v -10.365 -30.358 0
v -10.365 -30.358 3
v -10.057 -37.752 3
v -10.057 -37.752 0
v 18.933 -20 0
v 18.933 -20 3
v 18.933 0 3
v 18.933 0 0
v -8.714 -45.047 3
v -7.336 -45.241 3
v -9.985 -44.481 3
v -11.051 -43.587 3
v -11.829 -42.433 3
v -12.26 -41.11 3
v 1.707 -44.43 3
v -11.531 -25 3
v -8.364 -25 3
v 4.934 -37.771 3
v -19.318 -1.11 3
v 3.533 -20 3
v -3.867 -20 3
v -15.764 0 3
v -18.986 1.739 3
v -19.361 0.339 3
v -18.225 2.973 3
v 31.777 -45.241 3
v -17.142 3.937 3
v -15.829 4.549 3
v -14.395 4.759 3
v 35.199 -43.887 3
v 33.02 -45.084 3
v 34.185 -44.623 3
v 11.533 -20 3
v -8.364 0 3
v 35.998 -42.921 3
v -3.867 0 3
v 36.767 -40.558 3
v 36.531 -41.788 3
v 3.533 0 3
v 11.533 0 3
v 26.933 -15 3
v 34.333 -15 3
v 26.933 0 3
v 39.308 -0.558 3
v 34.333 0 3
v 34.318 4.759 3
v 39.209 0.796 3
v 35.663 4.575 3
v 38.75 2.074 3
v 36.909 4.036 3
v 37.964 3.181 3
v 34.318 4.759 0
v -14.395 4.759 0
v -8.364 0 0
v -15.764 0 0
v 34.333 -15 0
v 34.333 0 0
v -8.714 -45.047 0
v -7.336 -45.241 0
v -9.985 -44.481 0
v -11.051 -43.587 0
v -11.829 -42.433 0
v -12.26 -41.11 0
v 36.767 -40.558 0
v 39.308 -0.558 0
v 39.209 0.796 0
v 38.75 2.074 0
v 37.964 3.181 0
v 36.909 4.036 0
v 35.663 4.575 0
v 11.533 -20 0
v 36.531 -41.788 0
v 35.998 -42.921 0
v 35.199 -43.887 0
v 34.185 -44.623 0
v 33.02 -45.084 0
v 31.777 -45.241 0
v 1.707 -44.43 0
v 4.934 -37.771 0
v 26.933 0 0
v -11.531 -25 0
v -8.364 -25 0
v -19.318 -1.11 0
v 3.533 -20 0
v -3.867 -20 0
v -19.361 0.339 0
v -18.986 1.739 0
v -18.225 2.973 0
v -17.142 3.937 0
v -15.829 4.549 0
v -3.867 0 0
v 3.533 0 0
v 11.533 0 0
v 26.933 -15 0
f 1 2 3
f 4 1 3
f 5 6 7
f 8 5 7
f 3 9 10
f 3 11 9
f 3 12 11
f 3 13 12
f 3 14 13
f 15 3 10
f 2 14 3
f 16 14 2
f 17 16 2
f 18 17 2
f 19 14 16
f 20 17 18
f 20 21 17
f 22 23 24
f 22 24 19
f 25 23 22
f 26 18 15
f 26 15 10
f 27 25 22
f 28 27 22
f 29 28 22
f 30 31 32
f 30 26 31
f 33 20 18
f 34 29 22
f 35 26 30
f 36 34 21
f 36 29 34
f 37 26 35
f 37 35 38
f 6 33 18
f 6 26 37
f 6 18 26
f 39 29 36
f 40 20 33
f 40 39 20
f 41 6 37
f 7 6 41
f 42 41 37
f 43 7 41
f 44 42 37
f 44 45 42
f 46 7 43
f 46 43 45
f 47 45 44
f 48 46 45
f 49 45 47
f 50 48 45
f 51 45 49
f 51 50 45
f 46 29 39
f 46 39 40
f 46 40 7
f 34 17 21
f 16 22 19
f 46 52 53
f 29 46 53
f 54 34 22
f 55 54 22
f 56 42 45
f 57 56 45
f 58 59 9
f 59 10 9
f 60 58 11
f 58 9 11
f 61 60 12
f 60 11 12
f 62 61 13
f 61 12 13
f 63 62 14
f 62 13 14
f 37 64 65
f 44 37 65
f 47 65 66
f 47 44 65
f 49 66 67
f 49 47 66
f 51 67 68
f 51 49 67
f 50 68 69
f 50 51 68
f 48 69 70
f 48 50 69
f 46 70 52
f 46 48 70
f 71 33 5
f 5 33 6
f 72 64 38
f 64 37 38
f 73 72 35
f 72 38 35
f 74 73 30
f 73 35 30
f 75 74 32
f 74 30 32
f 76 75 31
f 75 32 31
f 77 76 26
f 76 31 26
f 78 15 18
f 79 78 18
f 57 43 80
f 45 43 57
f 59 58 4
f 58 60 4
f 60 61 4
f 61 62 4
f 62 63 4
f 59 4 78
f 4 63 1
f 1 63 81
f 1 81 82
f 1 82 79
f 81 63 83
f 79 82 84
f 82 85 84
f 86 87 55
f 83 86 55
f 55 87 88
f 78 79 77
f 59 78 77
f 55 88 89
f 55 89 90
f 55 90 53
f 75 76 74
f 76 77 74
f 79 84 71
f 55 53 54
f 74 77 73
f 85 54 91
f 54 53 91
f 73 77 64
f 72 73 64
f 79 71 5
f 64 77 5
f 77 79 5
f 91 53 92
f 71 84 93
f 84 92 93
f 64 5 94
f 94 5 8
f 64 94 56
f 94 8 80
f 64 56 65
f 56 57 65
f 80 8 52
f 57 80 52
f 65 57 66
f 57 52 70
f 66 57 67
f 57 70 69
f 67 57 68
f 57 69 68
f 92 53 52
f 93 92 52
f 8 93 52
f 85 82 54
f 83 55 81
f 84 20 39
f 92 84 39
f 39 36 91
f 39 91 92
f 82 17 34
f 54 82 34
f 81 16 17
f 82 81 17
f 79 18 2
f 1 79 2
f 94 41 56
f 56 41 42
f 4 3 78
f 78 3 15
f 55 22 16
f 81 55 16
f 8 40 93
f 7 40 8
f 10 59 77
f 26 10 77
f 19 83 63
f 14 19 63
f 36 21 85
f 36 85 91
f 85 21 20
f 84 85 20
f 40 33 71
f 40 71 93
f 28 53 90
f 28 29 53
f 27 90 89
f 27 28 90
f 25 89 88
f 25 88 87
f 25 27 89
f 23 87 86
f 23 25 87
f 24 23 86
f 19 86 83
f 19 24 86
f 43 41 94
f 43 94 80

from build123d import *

# Parameters (mm, degrees)
F1_DEPTH = 3
F2_W     = 7.4
F2_H     = 15
F2_H_2   = 20
F3_DEPTH = 3
F5_DEPTH = 3
F6_R     = 5


with BuildPart() as f1:
    # F0 (on Top) → F1 (new body)
    with BuildSketch(Plane.XY):
        Polygon((36.469397, -45.240614), (39.645866, 4.759386), (-20.354134, 4.759386), (-11.530603, -45.240614), align=None)
    extrude(amount=F1_DEPTH)

    # F2 (on face) → F3 (cut, through all)
    with BuildSketch(Plane.XY.offset(3)):
        with Locations((30.633425, -7.5)):
            Rectangle(F2_W, F2_H)
        with Locations((15.233425, -10)):
            Rectangle(F2_W, F2_H_2)
        with Locations((-0.166575, -10)):
            Rectangle(F2_W, F2_H_2)
        Polygon((-8.364385, 0), (-15.764385, 0), (-11.530603, -25), (-8.364385, -25), align=None)
    extrude(amount=-F3_DEPTH, mode=Mode.SUBTRACT)

    # F4 (on face) → F5 (cut, through all)
    with BuildSketch(Plane.XY.offset(3)):
        Polygon((4.934109, -37.770947), (-10.364607, -30.358168), (-10.056541, -37.751752), (1.70737, -44.430388), align=None)
    extrude(amount=-F5_DEPTH, mode=Mode.SUBTRACT)

    # F6
    f6_edges = [f1.edges().sort_by_distance(p)[0] for p in [
        (-20.354134, 4.759386, 1.5),
        (39.645866, 4.759386, 1.5),
        (36.469397, -45.240614, 1.5),
        (-11.530603, -45.240614, 1.5),
    ]]
    fillet(f6_edges, radius=F6_R)


solid = f1.part
